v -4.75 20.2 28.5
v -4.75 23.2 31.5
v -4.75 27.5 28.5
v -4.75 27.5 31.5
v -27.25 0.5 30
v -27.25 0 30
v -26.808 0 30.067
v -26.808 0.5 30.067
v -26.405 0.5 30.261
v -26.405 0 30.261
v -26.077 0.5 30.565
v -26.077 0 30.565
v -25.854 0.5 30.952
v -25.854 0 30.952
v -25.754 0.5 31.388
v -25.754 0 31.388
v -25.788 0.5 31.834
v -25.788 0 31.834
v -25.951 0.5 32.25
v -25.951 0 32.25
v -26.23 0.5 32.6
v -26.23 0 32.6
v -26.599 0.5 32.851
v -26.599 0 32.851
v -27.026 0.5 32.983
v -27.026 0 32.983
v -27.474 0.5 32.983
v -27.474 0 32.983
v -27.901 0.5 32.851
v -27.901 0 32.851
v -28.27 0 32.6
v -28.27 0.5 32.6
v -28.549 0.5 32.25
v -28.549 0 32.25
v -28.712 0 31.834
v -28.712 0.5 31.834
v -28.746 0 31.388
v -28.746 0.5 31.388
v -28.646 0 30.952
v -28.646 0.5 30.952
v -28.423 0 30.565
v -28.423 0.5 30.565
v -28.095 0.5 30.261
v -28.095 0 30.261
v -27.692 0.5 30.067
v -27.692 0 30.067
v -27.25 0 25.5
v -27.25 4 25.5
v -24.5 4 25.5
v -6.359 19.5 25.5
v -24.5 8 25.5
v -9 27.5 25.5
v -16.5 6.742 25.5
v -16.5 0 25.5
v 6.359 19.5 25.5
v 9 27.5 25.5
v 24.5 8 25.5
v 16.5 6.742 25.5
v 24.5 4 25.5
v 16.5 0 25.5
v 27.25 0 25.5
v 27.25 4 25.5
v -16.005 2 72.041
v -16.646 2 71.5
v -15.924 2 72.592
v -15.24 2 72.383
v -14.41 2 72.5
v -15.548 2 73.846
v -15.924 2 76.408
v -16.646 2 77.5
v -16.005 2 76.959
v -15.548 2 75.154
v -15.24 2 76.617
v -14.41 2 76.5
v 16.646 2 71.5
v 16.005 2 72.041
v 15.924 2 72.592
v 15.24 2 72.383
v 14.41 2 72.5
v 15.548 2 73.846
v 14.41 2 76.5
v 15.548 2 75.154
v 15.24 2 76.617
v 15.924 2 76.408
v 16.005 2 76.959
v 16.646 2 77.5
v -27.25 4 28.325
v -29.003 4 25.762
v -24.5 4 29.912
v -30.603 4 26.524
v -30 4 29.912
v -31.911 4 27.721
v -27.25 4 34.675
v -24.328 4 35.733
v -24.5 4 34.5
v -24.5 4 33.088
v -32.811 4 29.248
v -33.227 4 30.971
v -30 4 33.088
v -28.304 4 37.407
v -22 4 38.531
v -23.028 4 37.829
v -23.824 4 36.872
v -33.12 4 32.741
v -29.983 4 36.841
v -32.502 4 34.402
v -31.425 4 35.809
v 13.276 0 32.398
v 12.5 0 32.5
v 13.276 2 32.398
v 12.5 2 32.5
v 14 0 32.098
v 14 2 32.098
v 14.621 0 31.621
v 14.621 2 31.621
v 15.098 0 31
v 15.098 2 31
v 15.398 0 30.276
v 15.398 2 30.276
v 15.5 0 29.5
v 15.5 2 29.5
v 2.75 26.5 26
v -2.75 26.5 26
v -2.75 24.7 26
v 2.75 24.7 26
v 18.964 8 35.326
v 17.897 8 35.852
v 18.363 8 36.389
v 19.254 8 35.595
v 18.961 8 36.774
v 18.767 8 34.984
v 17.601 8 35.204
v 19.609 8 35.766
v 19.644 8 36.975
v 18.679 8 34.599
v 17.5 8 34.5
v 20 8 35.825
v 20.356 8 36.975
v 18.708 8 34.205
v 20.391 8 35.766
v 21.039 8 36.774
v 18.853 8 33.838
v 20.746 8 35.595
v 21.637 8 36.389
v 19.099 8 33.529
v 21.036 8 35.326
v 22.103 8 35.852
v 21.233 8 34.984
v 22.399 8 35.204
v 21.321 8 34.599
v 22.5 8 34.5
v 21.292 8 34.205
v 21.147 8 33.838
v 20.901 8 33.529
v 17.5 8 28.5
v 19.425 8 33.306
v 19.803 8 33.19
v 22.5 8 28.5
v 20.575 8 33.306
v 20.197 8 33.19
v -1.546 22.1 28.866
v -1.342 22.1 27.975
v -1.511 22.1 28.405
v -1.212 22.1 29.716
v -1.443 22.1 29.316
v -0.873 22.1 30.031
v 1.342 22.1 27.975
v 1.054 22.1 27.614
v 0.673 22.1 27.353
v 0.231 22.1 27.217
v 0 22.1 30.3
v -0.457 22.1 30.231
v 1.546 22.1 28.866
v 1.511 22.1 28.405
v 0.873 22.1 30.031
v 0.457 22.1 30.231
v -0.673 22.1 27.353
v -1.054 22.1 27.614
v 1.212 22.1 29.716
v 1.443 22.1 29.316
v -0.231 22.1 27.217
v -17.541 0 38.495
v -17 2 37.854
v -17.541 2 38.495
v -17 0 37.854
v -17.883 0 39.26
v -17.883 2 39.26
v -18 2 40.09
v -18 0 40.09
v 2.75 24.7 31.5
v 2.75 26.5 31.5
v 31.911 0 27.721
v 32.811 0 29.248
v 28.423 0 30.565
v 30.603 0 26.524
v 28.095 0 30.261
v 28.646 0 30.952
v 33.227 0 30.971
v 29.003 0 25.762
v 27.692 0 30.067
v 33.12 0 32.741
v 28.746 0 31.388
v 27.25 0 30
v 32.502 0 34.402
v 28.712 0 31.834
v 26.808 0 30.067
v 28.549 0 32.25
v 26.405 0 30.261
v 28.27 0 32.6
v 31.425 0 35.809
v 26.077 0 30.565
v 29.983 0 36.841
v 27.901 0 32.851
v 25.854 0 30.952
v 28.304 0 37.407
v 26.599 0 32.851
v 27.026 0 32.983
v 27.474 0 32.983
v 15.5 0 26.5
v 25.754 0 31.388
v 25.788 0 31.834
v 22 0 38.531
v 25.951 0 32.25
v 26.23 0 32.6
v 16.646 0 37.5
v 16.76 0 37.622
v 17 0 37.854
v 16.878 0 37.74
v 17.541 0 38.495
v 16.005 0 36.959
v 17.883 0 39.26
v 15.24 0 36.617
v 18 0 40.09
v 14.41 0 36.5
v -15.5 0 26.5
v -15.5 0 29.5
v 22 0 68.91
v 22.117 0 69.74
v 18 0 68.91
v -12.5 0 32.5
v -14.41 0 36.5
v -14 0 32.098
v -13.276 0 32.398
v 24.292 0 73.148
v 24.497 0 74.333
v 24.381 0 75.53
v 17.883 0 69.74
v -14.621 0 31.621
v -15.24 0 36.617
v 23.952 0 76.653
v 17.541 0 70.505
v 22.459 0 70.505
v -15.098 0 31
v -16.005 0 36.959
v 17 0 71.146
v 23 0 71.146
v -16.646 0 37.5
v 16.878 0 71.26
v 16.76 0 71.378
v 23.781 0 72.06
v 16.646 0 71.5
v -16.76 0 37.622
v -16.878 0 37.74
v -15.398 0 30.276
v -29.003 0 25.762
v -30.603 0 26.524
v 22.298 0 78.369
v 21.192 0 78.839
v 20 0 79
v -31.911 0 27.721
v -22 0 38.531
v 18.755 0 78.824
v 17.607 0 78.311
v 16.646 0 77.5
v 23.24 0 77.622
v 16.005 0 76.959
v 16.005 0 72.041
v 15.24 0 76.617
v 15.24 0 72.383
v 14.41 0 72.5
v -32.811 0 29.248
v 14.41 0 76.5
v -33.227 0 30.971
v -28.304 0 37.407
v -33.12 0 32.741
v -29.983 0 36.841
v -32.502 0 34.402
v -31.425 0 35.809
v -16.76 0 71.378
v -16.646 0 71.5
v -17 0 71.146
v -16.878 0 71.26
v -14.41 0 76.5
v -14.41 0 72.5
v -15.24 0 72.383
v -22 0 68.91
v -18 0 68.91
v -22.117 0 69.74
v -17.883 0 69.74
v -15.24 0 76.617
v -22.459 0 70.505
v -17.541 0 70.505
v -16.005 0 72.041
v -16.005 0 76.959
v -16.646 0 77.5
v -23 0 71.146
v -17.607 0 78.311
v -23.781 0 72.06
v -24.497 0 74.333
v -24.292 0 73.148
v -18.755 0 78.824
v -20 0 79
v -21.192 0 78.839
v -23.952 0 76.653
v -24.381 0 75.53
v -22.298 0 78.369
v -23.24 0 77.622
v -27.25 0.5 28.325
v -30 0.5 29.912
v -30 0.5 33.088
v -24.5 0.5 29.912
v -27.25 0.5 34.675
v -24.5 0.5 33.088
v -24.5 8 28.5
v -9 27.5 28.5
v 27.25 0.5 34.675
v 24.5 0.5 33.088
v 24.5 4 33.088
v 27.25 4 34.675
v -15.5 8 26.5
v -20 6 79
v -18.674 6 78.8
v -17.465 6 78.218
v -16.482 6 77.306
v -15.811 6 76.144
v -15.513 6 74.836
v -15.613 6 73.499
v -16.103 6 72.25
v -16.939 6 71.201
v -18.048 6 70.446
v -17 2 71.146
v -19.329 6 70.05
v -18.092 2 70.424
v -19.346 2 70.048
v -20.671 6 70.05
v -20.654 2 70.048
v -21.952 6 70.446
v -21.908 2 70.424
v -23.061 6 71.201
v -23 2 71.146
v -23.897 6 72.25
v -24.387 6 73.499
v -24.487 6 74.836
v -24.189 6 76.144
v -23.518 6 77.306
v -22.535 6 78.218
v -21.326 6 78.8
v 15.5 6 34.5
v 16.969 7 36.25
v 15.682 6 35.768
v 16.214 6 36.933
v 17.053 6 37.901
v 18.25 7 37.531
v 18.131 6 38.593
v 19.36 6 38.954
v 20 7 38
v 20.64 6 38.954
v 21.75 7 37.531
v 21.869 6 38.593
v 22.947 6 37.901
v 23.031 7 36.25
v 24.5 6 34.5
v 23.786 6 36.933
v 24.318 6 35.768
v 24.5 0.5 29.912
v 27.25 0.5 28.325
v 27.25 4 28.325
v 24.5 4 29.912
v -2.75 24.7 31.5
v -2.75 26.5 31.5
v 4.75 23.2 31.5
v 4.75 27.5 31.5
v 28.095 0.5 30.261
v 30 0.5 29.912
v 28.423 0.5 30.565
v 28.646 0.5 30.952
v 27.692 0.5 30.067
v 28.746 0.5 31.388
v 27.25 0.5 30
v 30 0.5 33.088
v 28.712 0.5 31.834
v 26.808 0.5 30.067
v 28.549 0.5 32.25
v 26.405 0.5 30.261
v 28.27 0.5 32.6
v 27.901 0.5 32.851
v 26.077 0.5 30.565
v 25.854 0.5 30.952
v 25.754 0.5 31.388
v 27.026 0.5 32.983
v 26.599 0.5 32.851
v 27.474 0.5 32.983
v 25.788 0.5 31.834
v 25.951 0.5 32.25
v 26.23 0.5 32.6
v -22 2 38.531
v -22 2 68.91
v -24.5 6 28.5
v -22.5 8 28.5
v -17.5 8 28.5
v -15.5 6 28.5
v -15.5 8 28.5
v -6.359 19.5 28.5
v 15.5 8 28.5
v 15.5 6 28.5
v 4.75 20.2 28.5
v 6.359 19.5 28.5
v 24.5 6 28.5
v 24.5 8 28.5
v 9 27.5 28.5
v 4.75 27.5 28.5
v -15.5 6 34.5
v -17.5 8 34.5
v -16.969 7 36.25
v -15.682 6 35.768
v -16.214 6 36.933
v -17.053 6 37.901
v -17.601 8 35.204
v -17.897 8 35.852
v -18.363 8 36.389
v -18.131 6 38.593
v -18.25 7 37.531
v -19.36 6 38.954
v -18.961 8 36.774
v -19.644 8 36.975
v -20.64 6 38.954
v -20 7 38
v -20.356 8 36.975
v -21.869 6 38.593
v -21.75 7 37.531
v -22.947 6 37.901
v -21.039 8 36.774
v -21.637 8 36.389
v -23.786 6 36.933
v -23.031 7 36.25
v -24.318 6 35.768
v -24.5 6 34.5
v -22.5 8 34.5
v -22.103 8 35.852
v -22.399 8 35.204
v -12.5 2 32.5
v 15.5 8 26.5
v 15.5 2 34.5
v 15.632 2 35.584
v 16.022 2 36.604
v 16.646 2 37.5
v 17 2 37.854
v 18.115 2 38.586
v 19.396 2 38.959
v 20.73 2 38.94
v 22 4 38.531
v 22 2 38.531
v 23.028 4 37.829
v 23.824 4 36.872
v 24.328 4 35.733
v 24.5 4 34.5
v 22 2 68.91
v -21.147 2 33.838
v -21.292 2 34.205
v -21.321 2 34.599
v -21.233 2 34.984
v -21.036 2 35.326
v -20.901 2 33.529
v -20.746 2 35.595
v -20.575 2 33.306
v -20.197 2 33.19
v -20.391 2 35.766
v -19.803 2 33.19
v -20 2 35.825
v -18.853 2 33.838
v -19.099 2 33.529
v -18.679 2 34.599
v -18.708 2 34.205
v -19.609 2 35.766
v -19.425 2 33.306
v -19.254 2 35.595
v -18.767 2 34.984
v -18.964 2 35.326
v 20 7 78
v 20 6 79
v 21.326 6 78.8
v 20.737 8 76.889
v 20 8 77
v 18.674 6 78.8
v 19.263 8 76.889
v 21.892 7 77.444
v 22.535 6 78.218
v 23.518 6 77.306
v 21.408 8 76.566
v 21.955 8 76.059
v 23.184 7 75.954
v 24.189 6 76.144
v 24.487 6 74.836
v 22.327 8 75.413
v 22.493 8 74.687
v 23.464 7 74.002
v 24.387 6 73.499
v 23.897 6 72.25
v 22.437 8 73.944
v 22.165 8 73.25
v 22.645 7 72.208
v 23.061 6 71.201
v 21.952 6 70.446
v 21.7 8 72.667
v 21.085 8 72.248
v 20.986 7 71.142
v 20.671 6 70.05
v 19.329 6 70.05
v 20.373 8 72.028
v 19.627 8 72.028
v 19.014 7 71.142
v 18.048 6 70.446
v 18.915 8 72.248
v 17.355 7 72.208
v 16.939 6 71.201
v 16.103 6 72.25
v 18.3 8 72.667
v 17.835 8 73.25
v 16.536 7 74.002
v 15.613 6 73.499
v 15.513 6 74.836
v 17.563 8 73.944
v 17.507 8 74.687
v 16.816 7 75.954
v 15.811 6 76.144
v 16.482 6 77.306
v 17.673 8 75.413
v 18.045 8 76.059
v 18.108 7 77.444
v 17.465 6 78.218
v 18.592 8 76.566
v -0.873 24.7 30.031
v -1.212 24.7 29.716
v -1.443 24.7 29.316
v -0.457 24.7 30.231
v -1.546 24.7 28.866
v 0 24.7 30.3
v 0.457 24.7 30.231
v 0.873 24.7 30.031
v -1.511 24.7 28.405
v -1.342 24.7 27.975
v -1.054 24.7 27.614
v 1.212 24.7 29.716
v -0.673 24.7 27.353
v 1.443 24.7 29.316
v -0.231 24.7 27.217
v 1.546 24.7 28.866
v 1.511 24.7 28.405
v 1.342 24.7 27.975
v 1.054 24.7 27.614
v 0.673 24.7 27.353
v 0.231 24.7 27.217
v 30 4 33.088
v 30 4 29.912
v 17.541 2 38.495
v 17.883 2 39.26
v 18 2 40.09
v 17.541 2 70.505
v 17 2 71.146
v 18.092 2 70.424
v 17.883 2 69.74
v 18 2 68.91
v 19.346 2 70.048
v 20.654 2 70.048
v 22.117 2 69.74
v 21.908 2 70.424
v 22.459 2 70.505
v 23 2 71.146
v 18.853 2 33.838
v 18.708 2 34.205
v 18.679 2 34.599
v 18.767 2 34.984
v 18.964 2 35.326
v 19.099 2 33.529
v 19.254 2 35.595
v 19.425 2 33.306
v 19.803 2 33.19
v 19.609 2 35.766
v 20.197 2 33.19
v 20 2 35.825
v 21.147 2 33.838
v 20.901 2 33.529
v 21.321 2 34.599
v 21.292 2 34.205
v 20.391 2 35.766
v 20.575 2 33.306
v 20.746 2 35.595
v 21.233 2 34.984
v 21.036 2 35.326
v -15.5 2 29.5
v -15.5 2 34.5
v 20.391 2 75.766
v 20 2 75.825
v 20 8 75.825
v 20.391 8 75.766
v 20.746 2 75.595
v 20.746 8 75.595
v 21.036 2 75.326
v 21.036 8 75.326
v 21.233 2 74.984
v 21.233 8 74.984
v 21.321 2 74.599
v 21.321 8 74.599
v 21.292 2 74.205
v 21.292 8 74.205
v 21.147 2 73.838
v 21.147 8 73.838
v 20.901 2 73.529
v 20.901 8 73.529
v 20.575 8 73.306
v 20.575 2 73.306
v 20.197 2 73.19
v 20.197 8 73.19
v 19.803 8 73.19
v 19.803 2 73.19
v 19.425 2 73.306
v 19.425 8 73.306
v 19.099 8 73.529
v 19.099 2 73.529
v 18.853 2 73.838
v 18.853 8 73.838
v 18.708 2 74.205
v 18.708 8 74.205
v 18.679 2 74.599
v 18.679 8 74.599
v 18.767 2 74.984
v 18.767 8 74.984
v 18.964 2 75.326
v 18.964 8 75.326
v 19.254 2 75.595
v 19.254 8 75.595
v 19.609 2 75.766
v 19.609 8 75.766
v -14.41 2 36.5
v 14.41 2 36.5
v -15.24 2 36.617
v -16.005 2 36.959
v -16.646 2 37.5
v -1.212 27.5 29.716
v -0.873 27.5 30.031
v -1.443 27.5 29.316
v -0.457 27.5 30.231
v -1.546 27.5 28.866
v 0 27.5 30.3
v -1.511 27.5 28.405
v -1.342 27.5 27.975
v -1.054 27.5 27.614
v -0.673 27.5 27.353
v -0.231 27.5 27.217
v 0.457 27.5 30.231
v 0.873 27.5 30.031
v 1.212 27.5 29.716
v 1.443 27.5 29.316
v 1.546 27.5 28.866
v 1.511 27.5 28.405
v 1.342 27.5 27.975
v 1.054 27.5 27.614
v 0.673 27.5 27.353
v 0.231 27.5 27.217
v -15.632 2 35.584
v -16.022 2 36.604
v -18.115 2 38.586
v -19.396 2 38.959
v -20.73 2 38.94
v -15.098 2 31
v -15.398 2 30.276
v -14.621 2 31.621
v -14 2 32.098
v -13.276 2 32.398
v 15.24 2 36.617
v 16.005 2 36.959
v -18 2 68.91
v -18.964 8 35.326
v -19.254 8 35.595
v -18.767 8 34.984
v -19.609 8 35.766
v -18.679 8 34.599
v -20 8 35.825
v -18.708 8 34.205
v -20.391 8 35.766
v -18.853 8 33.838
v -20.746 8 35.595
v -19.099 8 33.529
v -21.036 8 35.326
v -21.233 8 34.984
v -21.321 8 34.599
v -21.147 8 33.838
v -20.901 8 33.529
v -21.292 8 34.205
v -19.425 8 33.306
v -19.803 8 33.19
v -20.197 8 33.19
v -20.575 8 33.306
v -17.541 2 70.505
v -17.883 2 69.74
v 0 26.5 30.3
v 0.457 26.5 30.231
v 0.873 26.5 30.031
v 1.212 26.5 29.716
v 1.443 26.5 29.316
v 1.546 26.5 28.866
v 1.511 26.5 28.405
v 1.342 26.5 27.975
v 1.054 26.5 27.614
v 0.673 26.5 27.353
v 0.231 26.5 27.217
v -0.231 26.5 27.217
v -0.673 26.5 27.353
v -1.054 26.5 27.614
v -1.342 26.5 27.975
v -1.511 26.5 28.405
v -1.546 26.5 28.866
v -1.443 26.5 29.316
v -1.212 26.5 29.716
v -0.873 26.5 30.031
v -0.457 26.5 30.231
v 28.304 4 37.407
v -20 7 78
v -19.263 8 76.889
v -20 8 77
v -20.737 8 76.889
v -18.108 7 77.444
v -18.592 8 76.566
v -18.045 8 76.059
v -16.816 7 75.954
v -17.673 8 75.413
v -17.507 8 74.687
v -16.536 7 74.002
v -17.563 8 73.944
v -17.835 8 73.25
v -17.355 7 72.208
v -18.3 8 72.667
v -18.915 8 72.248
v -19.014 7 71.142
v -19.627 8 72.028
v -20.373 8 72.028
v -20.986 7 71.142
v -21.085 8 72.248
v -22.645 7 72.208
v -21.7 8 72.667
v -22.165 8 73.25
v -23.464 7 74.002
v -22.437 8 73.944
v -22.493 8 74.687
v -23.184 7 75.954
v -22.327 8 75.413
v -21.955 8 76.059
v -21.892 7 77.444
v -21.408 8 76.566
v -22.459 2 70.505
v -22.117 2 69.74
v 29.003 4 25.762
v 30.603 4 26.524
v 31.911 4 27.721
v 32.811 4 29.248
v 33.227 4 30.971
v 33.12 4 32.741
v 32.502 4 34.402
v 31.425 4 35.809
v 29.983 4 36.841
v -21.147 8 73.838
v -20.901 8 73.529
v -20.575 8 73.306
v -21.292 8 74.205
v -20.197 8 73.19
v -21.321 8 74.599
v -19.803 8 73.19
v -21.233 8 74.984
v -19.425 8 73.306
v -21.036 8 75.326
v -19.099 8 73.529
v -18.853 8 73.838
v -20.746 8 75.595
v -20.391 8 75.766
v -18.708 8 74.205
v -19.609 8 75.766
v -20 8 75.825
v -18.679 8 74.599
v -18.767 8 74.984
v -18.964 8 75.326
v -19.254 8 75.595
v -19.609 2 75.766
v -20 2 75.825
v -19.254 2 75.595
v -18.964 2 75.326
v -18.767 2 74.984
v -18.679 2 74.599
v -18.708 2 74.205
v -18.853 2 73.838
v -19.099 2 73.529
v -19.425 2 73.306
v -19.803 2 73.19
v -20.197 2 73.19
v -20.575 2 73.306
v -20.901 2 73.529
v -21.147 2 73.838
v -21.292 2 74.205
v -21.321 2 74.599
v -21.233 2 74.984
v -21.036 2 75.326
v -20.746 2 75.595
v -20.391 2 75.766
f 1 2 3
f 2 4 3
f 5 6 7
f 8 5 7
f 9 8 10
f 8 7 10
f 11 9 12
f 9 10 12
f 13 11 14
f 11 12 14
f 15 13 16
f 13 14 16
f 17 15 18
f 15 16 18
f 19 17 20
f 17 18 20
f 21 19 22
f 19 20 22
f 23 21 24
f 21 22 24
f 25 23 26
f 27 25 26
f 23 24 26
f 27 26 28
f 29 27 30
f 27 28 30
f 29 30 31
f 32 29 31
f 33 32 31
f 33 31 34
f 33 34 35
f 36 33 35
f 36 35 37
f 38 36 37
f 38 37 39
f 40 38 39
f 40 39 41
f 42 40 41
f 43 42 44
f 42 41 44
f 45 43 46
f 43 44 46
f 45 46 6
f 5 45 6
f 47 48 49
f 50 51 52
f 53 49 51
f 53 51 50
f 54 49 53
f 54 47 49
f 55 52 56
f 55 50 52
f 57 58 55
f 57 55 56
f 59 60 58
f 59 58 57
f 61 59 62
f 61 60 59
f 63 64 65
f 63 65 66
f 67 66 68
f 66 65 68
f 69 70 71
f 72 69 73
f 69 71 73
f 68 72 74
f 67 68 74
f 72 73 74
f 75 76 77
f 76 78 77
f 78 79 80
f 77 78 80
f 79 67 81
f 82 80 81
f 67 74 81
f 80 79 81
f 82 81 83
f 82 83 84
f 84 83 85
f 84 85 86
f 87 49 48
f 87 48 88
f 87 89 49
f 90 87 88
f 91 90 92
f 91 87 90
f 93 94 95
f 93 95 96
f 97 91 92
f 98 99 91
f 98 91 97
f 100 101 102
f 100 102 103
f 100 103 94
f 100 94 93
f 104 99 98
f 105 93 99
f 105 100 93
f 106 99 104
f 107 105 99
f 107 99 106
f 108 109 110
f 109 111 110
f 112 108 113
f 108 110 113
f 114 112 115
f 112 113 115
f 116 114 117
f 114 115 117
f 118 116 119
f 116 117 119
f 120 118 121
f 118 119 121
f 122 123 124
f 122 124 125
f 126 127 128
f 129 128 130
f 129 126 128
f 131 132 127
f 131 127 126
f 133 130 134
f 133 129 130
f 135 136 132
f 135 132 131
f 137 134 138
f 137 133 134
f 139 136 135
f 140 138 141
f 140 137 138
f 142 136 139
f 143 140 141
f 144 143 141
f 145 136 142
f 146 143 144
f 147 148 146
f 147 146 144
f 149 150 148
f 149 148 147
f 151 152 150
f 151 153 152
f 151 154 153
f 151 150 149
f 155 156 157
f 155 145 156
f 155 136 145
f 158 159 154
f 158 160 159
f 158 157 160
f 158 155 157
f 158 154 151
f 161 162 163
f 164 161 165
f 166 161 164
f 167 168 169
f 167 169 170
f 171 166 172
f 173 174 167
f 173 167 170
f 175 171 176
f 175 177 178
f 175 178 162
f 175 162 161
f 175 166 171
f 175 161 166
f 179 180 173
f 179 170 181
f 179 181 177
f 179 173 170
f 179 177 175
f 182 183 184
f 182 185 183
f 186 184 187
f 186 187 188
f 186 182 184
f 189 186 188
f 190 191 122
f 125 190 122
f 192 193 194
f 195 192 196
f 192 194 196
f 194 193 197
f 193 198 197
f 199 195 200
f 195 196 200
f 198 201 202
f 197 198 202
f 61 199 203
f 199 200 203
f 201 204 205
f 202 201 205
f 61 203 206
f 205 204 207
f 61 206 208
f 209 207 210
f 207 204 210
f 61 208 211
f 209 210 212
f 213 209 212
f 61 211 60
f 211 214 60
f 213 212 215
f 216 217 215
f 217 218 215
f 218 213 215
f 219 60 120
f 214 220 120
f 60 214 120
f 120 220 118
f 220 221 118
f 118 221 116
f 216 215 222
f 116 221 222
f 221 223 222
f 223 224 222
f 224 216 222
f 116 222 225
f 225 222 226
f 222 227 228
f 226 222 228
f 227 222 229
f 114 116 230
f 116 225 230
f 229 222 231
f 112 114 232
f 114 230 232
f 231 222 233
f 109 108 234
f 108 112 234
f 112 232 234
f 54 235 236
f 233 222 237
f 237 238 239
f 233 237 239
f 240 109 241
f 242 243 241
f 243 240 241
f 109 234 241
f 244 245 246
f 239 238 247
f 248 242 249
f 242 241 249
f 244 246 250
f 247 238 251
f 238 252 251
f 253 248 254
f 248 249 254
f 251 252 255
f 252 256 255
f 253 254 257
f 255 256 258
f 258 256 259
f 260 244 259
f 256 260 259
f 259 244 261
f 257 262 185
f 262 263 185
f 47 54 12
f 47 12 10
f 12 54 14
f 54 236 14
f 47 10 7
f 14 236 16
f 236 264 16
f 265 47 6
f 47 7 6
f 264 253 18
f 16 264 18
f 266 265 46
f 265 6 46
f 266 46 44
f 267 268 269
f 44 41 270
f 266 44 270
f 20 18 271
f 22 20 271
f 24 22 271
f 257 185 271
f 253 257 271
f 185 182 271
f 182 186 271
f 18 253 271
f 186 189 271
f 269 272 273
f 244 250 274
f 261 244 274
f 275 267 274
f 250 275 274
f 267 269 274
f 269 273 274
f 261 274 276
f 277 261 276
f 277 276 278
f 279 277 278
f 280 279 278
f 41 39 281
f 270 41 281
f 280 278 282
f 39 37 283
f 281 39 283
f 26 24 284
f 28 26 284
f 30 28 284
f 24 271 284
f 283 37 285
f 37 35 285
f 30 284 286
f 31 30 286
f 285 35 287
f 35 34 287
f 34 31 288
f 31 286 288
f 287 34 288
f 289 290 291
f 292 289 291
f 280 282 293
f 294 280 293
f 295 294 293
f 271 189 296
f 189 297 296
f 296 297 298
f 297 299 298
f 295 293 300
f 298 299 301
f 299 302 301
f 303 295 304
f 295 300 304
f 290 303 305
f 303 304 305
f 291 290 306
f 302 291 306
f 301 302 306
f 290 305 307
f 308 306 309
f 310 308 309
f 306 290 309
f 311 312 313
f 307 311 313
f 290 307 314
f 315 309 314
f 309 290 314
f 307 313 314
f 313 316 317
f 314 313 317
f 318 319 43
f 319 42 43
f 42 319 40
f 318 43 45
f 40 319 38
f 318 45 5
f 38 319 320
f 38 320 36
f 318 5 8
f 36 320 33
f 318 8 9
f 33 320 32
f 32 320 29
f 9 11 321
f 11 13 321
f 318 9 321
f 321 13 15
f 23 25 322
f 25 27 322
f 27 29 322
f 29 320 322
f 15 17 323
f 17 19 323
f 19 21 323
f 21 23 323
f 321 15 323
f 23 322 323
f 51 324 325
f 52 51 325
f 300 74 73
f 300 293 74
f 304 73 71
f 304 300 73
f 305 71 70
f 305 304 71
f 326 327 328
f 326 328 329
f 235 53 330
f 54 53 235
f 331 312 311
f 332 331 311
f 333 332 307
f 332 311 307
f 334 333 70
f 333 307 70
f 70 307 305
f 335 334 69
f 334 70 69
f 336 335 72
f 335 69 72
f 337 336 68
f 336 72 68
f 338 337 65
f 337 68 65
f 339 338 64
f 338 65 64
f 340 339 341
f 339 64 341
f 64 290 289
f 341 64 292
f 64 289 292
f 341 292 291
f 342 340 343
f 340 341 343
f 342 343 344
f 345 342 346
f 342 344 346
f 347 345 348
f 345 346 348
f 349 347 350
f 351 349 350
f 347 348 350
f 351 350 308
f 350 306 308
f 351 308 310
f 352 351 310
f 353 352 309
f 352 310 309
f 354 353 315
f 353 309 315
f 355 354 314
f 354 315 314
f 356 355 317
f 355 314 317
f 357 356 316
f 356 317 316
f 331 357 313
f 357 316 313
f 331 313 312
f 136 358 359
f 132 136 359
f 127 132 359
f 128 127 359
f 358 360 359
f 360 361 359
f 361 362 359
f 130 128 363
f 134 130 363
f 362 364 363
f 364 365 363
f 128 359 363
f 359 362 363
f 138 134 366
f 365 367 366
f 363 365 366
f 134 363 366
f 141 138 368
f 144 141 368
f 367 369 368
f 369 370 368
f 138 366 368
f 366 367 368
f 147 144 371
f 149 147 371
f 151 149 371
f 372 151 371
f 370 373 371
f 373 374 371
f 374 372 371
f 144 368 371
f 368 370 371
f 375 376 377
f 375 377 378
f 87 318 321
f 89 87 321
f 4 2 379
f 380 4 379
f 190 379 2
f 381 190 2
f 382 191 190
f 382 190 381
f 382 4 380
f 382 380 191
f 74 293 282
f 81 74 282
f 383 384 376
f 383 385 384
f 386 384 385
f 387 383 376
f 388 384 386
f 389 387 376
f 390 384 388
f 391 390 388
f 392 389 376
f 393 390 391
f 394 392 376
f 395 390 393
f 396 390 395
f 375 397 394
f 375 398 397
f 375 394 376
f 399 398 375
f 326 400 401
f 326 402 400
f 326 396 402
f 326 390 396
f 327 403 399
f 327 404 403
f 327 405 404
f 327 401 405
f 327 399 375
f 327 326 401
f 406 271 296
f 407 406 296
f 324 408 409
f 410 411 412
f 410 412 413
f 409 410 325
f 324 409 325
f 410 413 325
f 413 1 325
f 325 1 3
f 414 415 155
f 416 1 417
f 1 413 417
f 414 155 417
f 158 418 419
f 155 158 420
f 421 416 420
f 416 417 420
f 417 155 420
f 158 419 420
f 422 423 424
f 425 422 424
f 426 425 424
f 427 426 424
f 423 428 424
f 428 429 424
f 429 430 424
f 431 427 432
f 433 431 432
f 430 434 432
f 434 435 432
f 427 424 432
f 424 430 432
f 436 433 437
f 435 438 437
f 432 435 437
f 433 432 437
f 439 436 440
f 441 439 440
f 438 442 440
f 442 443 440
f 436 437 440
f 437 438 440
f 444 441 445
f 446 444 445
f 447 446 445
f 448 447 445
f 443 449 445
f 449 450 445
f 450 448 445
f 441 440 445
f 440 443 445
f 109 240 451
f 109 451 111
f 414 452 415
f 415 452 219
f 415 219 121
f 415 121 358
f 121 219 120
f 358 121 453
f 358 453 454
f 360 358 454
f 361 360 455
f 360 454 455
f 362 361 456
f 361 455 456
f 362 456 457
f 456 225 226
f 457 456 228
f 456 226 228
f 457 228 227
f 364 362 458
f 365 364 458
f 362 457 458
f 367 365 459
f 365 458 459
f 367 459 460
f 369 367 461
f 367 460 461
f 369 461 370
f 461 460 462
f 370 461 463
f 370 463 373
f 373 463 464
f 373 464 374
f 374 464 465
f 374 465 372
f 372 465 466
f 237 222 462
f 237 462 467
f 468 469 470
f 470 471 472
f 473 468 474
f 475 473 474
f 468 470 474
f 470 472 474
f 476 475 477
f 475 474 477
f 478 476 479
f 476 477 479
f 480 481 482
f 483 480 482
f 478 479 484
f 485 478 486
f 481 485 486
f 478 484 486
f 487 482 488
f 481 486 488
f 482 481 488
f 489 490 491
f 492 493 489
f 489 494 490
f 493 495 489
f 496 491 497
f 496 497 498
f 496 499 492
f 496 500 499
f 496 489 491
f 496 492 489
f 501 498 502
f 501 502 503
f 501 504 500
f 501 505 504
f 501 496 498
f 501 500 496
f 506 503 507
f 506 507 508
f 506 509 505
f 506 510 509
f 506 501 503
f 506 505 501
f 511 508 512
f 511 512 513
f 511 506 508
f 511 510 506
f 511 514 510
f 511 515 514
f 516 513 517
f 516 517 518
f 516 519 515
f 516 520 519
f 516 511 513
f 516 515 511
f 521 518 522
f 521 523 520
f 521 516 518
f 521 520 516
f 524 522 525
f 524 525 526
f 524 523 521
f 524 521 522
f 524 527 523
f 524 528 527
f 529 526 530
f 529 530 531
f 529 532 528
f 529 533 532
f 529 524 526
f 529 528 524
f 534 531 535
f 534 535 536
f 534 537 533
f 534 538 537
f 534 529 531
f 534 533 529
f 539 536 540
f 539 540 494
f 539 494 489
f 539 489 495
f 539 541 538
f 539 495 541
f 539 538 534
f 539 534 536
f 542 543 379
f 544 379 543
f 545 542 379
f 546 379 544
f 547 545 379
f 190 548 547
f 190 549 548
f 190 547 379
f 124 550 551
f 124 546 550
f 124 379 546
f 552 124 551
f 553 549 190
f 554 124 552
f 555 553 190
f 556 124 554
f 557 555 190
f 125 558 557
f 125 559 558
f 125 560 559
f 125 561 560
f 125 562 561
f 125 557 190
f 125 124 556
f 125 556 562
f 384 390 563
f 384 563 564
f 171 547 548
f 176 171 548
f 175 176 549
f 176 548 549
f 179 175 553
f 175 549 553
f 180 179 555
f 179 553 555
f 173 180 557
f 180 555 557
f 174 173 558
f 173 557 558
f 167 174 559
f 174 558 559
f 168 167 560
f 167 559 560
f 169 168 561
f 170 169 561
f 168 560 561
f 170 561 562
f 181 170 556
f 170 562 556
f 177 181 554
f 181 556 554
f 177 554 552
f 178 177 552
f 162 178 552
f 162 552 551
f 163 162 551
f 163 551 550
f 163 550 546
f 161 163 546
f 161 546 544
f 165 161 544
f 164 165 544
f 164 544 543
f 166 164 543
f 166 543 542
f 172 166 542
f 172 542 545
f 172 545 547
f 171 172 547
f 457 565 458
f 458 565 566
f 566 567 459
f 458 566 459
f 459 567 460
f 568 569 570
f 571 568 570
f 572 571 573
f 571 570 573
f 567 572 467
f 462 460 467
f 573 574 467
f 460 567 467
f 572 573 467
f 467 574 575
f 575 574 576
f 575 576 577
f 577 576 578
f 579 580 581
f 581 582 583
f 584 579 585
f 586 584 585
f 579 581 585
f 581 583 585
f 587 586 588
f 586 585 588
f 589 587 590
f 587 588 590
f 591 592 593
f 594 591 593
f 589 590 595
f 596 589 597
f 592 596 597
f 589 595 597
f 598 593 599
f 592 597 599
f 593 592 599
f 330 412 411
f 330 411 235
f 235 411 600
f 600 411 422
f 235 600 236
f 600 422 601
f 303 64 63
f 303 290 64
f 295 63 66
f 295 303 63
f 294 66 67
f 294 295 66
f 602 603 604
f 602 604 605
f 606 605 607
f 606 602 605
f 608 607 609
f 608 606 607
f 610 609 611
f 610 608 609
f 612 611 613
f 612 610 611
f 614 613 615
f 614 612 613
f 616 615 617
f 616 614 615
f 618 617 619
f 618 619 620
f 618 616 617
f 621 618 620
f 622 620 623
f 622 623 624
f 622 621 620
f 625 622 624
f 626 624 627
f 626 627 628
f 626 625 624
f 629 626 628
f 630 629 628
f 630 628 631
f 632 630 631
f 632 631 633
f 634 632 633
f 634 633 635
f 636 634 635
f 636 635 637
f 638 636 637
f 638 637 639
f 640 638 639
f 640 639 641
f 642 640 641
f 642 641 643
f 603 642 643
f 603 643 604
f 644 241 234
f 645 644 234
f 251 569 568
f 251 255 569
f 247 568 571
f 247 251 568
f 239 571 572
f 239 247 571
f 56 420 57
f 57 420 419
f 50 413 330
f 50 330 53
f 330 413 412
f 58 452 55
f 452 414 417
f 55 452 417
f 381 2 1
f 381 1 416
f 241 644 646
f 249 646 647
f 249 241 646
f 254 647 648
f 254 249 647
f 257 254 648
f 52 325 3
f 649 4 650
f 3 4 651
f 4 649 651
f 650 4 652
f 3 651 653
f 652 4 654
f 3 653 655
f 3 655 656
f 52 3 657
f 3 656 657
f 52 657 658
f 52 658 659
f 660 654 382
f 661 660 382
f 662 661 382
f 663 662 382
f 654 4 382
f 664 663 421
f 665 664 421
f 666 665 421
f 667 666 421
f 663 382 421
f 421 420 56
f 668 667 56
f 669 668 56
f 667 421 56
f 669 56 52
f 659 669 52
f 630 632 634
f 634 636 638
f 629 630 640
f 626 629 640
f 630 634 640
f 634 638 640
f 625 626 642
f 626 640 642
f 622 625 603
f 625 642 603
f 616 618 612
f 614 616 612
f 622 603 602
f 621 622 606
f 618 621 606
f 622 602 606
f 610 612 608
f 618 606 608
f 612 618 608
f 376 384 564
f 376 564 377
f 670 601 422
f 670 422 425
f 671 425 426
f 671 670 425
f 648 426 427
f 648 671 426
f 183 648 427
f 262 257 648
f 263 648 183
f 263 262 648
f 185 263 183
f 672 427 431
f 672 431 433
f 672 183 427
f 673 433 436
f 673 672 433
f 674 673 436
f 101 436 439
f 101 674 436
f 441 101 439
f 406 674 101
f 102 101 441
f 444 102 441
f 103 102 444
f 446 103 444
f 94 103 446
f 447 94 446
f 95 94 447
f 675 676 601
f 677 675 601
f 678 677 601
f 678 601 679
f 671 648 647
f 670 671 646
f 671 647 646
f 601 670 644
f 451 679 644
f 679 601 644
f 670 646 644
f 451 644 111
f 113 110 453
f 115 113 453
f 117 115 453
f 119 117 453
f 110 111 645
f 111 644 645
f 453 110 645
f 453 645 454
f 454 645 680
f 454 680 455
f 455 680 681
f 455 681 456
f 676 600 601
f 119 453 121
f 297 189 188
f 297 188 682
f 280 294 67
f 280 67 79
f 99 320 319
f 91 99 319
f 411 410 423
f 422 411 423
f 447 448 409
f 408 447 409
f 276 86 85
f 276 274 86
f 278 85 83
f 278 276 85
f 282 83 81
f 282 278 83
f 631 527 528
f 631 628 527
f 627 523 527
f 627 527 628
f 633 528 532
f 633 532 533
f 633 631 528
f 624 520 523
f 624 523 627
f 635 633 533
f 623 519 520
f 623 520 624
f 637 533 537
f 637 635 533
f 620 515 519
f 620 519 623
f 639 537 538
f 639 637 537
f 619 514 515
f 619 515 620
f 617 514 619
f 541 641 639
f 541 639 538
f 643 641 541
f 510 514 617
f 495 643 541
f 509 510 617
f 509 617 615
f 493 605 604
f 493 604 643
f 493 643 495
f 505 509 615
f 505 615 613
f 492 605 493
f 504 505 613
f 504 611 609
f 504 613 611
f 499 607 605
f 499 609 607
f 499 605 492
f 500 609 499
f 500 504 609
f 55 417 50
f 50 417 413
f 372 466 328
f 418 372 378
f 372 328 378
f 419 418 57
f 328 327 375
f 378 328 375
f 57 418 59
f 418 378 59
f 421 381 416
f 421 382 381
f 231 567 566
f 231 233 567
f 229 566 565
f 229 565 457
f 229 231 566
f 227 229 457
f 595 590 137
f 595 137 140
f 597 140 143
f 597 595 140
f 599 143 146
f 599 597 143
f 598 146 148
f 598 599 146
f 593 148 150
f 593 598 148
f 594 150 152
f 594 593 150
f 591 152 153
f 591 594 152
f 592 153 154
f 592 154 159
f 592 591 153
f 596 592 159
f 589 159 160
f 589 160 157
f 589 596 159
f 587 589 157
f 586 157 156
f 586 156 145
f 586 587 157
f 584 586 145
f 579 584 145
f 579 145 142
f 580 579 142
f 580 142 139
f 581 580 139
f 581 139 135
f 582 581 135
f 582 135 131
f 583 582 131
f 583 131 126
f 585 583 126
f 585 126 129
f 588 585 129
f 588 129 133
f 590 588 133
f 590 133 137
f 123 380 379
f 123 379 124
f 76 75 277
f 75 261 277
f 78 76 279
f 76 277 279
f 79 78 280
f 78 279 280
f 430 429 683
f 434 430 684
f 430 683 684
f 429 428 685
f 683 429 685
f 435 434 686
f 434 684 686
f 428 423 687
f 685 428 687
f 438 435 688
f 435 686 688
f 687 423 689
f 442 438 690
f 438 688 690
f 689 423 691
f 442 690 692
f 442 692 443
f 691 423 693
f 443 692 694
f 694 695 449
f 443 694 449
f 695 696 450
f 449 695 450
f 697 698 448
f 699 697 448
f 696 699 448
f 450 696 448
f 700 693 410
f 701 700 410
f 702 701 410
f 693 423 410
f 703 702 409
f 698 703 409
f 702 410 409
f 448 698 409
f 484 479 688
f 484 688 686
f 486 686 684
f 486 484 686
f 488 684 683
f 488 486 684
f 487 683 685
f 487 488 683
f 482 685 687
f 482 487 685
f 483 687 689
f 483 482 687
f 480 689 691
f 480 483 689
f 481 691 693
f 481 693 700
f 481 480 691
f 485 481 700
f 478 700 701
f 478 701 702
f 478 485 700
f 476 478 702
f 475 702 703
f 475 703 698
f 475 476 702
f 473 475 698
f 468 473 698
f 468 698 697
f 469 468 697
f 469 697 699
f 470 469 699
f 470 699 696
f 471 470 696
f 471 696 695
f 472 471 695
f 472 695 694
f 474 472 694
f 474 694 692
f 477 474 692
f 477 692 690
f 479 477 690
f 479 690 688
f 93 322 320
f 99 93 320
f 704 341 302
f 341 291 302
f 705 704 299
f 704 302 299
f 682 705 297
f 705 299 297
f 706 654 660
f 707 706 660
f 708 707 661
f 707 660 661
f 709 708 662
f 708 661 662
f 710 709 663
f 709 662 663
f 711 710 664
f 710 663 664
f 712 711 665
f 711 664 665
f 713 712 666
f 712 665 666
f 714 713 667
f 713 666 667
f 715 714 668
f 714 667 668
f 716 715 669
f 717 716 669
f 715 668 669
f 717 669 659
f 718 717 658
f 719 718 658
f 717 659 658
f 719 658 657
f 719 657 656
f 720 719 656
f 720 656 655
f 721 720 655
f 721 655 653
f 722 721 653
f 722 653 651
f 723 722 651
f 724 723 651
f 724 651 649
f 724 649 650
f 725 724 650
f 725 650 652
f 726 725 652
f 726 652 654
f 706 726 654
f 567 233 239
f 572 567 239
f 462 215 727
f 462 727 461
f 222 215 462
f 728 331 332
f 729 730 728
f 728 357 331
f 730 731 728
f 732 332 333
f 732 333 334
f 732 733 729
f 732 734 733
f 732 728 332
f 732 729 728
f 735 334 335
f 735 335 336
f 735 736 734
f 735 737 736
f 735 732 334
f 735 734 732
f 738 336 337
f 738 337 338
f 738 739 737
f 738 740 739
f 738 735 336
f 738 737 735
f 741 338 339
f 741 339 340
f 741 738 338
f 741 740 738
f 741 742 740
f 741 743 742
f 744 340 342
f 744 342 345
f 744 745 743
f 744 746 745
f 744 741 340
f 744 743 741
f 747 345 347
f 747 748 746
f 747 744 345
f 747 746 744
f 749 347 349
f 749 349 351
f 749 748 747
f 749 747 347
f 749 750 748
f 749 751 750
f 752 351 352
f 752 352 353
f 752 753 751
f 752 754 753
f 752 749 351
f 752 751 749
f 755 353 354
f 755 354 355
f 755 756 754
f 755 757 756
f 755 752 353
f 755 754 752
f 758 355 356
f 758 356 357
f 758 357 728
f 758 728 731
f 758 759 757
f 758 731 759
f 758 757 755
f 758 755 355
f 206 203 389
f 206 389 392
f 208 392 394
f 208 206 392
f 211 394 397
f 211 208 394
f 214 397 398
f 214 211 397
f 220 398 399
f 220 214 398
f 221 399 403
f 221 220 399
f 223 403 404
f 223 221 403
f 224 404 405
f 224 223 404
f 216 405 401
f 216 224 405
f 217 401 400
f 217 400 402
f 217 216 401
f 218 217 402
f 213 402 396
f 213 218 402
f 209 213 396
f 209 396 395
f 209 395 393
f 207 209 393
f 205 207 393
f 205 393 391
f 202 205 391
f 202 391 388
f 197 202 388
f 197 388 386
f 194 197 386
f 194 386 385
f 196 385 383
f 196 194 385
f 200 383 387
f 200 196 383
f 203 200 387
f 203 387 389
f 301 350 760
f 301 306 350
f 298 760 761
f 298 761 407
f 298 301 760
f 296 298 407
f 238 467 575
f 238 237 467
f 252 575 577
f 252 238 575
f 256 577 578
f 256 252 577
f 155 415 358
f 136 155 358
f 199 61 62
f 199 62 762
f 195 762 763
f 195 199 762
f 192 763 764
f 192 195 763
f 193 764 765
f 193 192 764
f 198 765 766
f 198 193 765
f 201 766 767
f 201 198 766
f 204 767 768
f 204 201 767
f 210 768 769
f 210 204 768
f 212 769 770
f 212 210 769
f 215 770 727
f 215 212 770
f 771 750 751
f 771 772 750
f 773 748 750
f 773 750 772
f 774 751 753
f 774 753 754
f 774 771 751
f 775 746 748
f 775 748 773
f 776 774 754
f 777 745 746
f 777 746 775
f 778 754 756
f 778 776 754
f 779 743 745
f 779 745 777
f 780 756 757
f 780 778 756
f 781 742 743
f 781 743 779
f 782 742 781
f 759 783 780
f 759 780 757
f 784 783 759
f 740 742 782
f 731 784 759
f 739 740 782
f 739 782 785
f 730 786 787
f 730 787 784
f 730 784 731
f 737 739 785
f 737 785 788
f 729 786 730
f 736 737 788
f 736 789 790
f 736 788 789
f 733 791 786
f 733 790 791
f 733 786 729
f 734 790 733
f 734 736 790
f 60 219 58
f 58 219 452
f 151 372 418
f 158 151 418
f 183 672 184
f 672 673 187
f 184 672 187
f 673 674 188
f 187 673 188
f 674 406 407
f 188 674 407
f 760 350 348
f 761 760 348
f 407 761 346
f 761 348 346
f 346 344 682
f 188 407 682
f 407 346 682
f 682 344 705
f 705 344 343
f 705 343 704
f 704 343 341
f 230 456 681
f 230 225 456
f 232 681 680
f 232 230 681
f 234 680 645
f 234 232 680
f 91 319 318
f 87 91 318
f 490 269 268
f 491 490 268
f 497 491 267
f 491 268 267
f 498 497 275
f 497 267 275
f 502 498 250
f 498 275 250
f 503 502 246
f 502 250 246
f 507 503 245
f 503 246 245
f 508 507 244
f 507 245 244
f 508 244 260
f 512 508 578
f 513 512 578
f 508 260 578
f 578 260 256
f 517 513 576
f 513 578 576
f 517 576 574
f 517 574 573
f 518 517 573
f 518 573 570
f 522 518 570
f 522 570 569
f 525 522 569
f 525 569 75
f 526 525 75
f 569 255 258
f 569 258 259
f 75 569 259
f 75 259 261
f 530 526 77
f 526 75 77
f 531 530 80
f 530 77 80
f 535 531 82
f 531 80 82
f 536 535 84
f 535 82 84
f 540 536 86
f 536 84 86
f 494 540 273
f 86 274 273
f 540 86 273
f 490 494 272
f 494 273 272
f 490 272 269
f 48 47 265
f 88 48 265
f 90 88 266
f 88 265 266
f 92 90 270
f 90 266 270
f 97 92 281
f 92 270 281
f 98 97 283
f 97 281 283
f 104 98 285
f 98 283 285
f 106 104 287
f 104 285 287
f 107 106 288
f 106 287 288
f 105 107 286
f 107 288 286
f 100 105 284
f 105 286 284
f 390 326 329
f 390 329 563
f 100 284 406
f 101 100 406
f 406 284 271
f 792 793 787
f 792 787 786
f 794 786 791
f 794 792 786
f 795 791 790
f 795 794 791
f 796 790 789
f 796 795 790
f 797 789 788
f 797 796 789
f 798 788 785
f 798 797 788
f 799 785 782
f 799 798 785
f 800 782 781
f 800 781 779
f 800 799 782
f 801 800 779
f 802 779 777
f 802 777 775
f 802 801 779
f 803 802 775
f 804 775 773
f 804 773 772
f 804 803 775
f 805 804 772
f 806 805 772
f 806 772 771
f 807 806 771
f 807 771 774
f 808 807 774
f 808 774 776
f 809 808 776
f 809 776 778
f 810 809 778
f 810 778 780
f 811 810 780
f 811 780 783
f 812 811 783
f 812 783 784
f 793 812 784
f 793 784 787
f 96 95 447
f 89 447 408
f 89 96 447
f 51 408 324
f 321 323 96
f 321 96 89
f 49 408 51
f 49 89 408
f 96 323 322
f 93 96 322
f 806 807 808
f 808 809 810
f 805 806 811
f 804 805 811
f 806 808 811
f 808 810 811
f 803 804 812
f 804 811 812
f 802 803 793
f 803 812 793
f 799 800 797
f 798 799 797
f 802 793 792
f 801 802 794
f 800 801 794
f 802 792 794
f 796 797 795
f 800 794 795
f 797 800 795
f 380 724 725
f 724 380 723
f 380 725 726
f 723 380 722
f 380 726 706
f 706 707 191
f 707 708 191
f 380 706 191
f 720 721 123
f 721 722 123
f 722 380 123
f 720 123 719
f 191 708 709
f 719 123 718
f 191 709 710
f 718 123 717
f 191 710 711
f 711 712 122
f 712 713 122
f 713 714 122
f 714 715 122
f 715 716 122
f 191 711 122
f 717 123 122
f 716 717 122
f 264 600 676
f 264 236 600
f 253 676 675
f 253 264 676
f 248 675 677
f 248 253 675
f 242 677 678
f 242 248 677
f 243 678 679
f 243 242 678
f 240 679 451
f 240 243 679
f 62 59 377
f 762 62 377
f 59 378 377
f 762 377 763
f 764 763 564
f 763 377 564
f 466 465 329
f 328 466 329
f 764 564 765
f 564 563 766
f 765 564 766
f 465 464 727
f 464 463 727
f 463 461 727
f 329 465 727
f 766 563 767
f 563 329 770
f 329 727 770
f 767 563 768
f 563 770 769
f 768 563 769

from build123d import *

# Parameters (mm, degrees)
SKETCH1_R             = 4.5
SKETCH1_R_2           = 1.325
BOSS_EXTRUDE1_DEPTH   = 8
BOSS_EXTRUDE1_2_DEPTH = 8
BOSS_EXTRUDE1_3_DEPTH = 8
BOSS_EXTRUDE1_4_DEPTH = 8
BOSS_EXTRUDE2_REACH   = 95.306
SKETCH2_W             = 3
SKETCH2_H             = 27.5
CUT_EXTRUDE1_DEPTH    = 63.503999872
SKETCH4_W             = 44
SKETCH4_H             = 44
SKETCH4_W_2           = 36
SKETCH4_H_2           = 36
BOSS_EXTRUDE3_DEPTH   = 2
SKETCH7_W             = 9.5
SKETCH7_H             = 3
BOSS_EXTRUDE5_DEPTH   = 4.3
CUT_EXTRUDE3_START    = -1
SKETCH8_W             = 5.5
SKETCH8_H             = 5.5
CUT_EXTRUDE3_DEPTH    = 1.8
CHAMFER3_SIZE         = 3
SKETCH9_R             = 1.55
CUT_EXTRUDE4_DEPTH    = 5.4
BOSS_EXTRUDE6_DEPTH   = 4
SKETCH11_R            = 1.5
BOSS_EXTRUDE7_DEPTH   = 0.5
FILLET2_R             = 3
CHAMFER4_SIZE         = 1
CHAMFER5_SIZE         = 2


with BuildPart() as part:
    # Sketch1 → Boss-Extrude1 (new body)
    with BuildSketch(Plane(origin=(0, 0, 0), x_dir=(1, 0, 0), z_dir=(0, 1, 0))):
        with Locations(Location((20, -74.5, 0), (0, 0, 270))):
            Circle(SKETCH1_R)
        with Locations(Location((20, -74.5, 0), (0, 0, 270))):
            Circle(SKETCH1_R_2, mode=Mode.SUBTRACT)
    extrude(amount=BOSS_EXTRUDE1_DEPTH)



with BuildPart() as body_2:
    # Sketch1 → Boss-Extrude1 2 (new body)
    with BuildSketch(Plane(origin=(0, 0, 0), x_dir=(1, 0, 0), z_dir=(0, 1, 0))):
        with Locations(Location((-20, -74.5, 0), (0, 0, 270))):
            Circle(SKETCH1_R)
        with Locations(Location((-20, -74.5, 0), (0, 0, 270))):
            Circle(SKETCH1_R_2, mode=Mode.SUBTRACT)
    extrude(amount=BOSS_EXTRUDE1_2_DEPTH)


with BuildPart() as body_3:
    # Sketch1 → Boss-Extrude1 3 (new body)
    with BuildSketch(Plane(origin=(0, 0, 0), x_dir=(1, 0, 0), z_dir=(0, 1, 0))):
        with BuildLine():
            Line((-24.5, -34.5), (-24.5, -25.5))
            Line((-24.5, -25.5), (-15.5, -25.5))
            Line((-15.5, -25.5), (-15.5, -34.5))
            ThreePointArc((-15.5, -34.5), (-20, -39), (-24.5, -34.5))
        make_face()
        with Locations(Location((-20, -34.5, 0), (0, 0, 270))):
            Circle(SKETCH1_R_2, mode=Mode.SUBTRACT)
    extrude(amount=BOSS_EXTRUDE1_3_DEPTH)

    # Boss-Extrude2: up to this face of the body (flat: up to its plane)
    boss_extrude2_end = Plane(body_3.part.faces().sort_by_distance((-24.5, 4, 30))[0])
    # Sketch2 → Boss-Extrude2 (add, up to the picked face)
    with BuildSketch(Plane(origin=(24.5, 0, 0), x_dir=(0, 0, -1), z_dir=(1, 0, 0)), mode=Mode.PRIVATE) as boss_extrude2_sk1:
        with Locations((-27, 13.75)):
            Rectangle(SKETCH2_W, SKETCH2_H)
    boss_extrude2_tool1 = split(extrude(boss_extrude2_sk1.sketch, amount=-BOSS_EXTRUDE2_REACH, mode=Mode.PRIVATE), bisect_by=boss_extrude2_end, keep=Keep.BOTH, mode=Mode.PRIVATE)


with BuildPart() as body_4:
    # Sketch1 → Boss-Extrude1 4 (new body)
    with BuildSketch(Plane(origin=(0, 0, 0), x_dir=(1, 0, 0), z_dir=(0, 1, 0))):
        with BuildLine():
            Line((24.5, -34.5), (24.5, -25.5))
            Line((24.5, -25.5), (15.5, -25.5))
            Line((15.5, -25.5), (15.5, -34.5))
            ThreePointArc((15.5, -34.5), (20, -39), (24.5, -34.5))
        make_face()
        with Locations(Location((20, -34.5, 0), (0, 0, 270))):
            Circle(SKETCH1_R_2, mode=Mode.SUBTRACT)
    extrude(amount=BOSS_EXTRUDE1_4_DEPTH)


with BuildPart() as body_3_1:
    add(body_3.part)

    add(body_4.part)  # Boss-Extrude2 merges body 4
    add(boss_extrude2_tool1.solids().sort_by(Axis((24.5, 13.75, 27), (-1, 0, 0)))[0])

    # Sketch3 → Cut-Extrude1 (cut, through all)
    with BuildSketch(Plane.XY.offset(28.5)):
        Polygon((-24.5, 8), (-9, 27.5), (-24.5, 27.5), align=None)
        Polygon((9, 27.5), (24.5, 8), (24.5, 27.5), align=None)
        Polygon((-15.5, 8), (-15.5, 0), (15.5, 0), (15.5, 8), (6.358974359, 19.5), (-6.358974359, 19.5), align=None)
    extrude(amount=-CUT_EXTRUDE1_DEPTH, mode=Mode.SUBTRACT)


with BuildPart() as part_1:
    add(part.part)

    add(body_2.part)  # Boss-Extrude3 merges body 2

    add(body_3_1.part)  # Boss-Extrude3 merges body 3
    # Sketch4 → Boss-Extrude3 (add)
    with BuildSketch(Plane.XZ):
        with Locations((0, 54.5)):
            Rectangle(SKETCH4_W, SKETCH4_H)
        with Locations((0, 54.5)):
            Rectangle(SKETCH4_W_2, SKETCH4_H_2, mode=Mode.SUBTRACT)
    extrude(amount=-BOSS_EXTRUDE3_DEPTH)

    # Sketch7 → Boss-Extrude5 (add)
    with BuildSketch(Plane(origin=(0, 27.5, 0), x_dir=(1, 0, 0), z_dir=(0, 1, 0))):
        with Locations((0, -30)):
            Rectangle(SKETCH7_W, SKETCH7_H)
    extrude(amount=-BOSS_EXTRUDE5_DEPTH)

    # Sketch8 → Cut-Extrude3 (cut)
    with BuildSketch(Plane(origin=(0, 27.5, 0), x_dir=(1, 0, 0), z_dir=(0, 1, 0)).offset(CUT_EXTRUDE3_START)):
        with Locations((0, -28.75)):
            Rectangle(SKETCH8_W, SKETCH8_H)
    extrude(amount=-CUT_EXTRUDE3_DEPTH, mode=Mode.SUBTRACT)

    # Chamfer3
    chamfer3_edges = [part_1.edges().sort_by_distance(p)[0] for p in [
        (0, 23.2, 28.5),
    ]]
    chamfer(chamfer3_edges, length=CHAMFER3_SIZE - 0.0001)  # a hair under: the kernel refuses the full size

    # Sketch9 → Cut-Extrude4 (cut)
    with BuildSketch(Plane(origin=(0, 27.5, 0), x_dir=(1, 0, 0), z_dir=(0, 1, 0))):
        with Locations(Location((0, -28.75, 0), (0, 0, 270))):
            Circle(SKETCH9_R)
    extrude(amount=-CUT_EXTRUDE4_DEPTH, mode=Mode.SUBTRACT)

    # Sketch10 → Boss-Extrude6 (add)
    with BuildSketch(Plane.XZ):
        with BuildLine():
            Line((-24.5, 25.5), (-27.25, 25.5))
            ThreePointArc((-27.25, 25.5), (-33.226647927, 30.971152617), (-28.303578206, 37.406773482))
            Line((-28.303578206, 37.406773482), (-22, 38.531128874))
            Line((-22, 38.531128874), (-22, 25.5))
            Line((-22, 25.5), (-24.5, 25.5))
        make_face()
        Polygon((-27.25, 28.324573519), (-24.5, 29.91228676), (-24.5, 33.08771324), (-27.25, 34.675426481), (-30, 33.08771324), (-30, 29.91228676), align=None, mode=Mode.SUBTRACT)
    boss_extrude6 = extrude(amount=-BOSS_EXTRUDE6_DEPTH)

    # Sketch11 → Boss-Extrude7 (add)
    with BuildSketch(Plane.XZ):
        Polygon((-30, 33.08771324), (-30, 29.91228676), (-27.25, 28.324573519), (-24.5, 29.91228676), (-24.5, 33.08771324), (-27.25, 34.675426481), align=None)
        with Locations(Location((-27.25, 31.5, 0), (0, 0, 270))):
            Circle(SKETCH11_R, mode=Mode.SUBTRACT)
    boss_extrude7 = extrude(amount=-BOSS_EXTRUDE7_DEPTH)

    # Mirror1: Boss-Extrude6, Boss-Extrude7 across plane
    add(boss_extrude6.mirror(Plane(origin=(0, 0, 0), x_dir=(0, 0, 1), z_dir=(1, 0, 0))))
    add(boss_extrude7.mirror(Plane(origin=(0, 0, 0), x_dir=(0, 0, 1), z_dir=(1, 0, 0))))

    # Fillet2
    fillet2_edges = [part_1.edges().sort_by_distance(p)[0] for p in [
        (15.968871126, 1, 76.5),
        (-18, 1, 70.468871126),
        (-15.968871126, 1, 76.5),
        (-22, 1, 70.468871126),
        (-15.968871126, 1, 72.5),
        (15.968871126, 1, 36.5),
        (-15.968871126, 1, 36.5),
        (15.5, 1, 32.5),
        (-15.5, 1, 32.5),
        (18, 1, 70.468871126),
        (-18, 1, 38.531128874),
        (22, 1, 70.468871126),
        (18, 1, 38.531128874),
        (15.968871126, 1, 72.5),
    ]]
    fillet(fillet2_edges, radius=FILLET2_R)

    # Chamfer4
    chamfer4_edges = [part_1.edges().sort_by_distance(p)[0] for p in [
        (15.5, 4, 25.5),
        (-15.5, 4, 25.5),
    ]]
    chamfer(chamfer4_edges, length=CHAMFER4_SIZE)

    # Chamfer5
    chamfer5_edges = [part_1.edges().sort_by_distance(p)[0] for p in [
        (20, 8, 70),
        (-20, 8, 70),
        (-24.5, 8, 31.5),
        (-20, 8, 39),
        (-15.5, 8, 31.5),
        (15.5, 8, 31.5),
        (20, 8, 39),
        (24.5, 8, 31.5),
    ]]
    chamfer(chamfer5_edges, length=CHAMFER5_SIZE)


solid = part_1.part
